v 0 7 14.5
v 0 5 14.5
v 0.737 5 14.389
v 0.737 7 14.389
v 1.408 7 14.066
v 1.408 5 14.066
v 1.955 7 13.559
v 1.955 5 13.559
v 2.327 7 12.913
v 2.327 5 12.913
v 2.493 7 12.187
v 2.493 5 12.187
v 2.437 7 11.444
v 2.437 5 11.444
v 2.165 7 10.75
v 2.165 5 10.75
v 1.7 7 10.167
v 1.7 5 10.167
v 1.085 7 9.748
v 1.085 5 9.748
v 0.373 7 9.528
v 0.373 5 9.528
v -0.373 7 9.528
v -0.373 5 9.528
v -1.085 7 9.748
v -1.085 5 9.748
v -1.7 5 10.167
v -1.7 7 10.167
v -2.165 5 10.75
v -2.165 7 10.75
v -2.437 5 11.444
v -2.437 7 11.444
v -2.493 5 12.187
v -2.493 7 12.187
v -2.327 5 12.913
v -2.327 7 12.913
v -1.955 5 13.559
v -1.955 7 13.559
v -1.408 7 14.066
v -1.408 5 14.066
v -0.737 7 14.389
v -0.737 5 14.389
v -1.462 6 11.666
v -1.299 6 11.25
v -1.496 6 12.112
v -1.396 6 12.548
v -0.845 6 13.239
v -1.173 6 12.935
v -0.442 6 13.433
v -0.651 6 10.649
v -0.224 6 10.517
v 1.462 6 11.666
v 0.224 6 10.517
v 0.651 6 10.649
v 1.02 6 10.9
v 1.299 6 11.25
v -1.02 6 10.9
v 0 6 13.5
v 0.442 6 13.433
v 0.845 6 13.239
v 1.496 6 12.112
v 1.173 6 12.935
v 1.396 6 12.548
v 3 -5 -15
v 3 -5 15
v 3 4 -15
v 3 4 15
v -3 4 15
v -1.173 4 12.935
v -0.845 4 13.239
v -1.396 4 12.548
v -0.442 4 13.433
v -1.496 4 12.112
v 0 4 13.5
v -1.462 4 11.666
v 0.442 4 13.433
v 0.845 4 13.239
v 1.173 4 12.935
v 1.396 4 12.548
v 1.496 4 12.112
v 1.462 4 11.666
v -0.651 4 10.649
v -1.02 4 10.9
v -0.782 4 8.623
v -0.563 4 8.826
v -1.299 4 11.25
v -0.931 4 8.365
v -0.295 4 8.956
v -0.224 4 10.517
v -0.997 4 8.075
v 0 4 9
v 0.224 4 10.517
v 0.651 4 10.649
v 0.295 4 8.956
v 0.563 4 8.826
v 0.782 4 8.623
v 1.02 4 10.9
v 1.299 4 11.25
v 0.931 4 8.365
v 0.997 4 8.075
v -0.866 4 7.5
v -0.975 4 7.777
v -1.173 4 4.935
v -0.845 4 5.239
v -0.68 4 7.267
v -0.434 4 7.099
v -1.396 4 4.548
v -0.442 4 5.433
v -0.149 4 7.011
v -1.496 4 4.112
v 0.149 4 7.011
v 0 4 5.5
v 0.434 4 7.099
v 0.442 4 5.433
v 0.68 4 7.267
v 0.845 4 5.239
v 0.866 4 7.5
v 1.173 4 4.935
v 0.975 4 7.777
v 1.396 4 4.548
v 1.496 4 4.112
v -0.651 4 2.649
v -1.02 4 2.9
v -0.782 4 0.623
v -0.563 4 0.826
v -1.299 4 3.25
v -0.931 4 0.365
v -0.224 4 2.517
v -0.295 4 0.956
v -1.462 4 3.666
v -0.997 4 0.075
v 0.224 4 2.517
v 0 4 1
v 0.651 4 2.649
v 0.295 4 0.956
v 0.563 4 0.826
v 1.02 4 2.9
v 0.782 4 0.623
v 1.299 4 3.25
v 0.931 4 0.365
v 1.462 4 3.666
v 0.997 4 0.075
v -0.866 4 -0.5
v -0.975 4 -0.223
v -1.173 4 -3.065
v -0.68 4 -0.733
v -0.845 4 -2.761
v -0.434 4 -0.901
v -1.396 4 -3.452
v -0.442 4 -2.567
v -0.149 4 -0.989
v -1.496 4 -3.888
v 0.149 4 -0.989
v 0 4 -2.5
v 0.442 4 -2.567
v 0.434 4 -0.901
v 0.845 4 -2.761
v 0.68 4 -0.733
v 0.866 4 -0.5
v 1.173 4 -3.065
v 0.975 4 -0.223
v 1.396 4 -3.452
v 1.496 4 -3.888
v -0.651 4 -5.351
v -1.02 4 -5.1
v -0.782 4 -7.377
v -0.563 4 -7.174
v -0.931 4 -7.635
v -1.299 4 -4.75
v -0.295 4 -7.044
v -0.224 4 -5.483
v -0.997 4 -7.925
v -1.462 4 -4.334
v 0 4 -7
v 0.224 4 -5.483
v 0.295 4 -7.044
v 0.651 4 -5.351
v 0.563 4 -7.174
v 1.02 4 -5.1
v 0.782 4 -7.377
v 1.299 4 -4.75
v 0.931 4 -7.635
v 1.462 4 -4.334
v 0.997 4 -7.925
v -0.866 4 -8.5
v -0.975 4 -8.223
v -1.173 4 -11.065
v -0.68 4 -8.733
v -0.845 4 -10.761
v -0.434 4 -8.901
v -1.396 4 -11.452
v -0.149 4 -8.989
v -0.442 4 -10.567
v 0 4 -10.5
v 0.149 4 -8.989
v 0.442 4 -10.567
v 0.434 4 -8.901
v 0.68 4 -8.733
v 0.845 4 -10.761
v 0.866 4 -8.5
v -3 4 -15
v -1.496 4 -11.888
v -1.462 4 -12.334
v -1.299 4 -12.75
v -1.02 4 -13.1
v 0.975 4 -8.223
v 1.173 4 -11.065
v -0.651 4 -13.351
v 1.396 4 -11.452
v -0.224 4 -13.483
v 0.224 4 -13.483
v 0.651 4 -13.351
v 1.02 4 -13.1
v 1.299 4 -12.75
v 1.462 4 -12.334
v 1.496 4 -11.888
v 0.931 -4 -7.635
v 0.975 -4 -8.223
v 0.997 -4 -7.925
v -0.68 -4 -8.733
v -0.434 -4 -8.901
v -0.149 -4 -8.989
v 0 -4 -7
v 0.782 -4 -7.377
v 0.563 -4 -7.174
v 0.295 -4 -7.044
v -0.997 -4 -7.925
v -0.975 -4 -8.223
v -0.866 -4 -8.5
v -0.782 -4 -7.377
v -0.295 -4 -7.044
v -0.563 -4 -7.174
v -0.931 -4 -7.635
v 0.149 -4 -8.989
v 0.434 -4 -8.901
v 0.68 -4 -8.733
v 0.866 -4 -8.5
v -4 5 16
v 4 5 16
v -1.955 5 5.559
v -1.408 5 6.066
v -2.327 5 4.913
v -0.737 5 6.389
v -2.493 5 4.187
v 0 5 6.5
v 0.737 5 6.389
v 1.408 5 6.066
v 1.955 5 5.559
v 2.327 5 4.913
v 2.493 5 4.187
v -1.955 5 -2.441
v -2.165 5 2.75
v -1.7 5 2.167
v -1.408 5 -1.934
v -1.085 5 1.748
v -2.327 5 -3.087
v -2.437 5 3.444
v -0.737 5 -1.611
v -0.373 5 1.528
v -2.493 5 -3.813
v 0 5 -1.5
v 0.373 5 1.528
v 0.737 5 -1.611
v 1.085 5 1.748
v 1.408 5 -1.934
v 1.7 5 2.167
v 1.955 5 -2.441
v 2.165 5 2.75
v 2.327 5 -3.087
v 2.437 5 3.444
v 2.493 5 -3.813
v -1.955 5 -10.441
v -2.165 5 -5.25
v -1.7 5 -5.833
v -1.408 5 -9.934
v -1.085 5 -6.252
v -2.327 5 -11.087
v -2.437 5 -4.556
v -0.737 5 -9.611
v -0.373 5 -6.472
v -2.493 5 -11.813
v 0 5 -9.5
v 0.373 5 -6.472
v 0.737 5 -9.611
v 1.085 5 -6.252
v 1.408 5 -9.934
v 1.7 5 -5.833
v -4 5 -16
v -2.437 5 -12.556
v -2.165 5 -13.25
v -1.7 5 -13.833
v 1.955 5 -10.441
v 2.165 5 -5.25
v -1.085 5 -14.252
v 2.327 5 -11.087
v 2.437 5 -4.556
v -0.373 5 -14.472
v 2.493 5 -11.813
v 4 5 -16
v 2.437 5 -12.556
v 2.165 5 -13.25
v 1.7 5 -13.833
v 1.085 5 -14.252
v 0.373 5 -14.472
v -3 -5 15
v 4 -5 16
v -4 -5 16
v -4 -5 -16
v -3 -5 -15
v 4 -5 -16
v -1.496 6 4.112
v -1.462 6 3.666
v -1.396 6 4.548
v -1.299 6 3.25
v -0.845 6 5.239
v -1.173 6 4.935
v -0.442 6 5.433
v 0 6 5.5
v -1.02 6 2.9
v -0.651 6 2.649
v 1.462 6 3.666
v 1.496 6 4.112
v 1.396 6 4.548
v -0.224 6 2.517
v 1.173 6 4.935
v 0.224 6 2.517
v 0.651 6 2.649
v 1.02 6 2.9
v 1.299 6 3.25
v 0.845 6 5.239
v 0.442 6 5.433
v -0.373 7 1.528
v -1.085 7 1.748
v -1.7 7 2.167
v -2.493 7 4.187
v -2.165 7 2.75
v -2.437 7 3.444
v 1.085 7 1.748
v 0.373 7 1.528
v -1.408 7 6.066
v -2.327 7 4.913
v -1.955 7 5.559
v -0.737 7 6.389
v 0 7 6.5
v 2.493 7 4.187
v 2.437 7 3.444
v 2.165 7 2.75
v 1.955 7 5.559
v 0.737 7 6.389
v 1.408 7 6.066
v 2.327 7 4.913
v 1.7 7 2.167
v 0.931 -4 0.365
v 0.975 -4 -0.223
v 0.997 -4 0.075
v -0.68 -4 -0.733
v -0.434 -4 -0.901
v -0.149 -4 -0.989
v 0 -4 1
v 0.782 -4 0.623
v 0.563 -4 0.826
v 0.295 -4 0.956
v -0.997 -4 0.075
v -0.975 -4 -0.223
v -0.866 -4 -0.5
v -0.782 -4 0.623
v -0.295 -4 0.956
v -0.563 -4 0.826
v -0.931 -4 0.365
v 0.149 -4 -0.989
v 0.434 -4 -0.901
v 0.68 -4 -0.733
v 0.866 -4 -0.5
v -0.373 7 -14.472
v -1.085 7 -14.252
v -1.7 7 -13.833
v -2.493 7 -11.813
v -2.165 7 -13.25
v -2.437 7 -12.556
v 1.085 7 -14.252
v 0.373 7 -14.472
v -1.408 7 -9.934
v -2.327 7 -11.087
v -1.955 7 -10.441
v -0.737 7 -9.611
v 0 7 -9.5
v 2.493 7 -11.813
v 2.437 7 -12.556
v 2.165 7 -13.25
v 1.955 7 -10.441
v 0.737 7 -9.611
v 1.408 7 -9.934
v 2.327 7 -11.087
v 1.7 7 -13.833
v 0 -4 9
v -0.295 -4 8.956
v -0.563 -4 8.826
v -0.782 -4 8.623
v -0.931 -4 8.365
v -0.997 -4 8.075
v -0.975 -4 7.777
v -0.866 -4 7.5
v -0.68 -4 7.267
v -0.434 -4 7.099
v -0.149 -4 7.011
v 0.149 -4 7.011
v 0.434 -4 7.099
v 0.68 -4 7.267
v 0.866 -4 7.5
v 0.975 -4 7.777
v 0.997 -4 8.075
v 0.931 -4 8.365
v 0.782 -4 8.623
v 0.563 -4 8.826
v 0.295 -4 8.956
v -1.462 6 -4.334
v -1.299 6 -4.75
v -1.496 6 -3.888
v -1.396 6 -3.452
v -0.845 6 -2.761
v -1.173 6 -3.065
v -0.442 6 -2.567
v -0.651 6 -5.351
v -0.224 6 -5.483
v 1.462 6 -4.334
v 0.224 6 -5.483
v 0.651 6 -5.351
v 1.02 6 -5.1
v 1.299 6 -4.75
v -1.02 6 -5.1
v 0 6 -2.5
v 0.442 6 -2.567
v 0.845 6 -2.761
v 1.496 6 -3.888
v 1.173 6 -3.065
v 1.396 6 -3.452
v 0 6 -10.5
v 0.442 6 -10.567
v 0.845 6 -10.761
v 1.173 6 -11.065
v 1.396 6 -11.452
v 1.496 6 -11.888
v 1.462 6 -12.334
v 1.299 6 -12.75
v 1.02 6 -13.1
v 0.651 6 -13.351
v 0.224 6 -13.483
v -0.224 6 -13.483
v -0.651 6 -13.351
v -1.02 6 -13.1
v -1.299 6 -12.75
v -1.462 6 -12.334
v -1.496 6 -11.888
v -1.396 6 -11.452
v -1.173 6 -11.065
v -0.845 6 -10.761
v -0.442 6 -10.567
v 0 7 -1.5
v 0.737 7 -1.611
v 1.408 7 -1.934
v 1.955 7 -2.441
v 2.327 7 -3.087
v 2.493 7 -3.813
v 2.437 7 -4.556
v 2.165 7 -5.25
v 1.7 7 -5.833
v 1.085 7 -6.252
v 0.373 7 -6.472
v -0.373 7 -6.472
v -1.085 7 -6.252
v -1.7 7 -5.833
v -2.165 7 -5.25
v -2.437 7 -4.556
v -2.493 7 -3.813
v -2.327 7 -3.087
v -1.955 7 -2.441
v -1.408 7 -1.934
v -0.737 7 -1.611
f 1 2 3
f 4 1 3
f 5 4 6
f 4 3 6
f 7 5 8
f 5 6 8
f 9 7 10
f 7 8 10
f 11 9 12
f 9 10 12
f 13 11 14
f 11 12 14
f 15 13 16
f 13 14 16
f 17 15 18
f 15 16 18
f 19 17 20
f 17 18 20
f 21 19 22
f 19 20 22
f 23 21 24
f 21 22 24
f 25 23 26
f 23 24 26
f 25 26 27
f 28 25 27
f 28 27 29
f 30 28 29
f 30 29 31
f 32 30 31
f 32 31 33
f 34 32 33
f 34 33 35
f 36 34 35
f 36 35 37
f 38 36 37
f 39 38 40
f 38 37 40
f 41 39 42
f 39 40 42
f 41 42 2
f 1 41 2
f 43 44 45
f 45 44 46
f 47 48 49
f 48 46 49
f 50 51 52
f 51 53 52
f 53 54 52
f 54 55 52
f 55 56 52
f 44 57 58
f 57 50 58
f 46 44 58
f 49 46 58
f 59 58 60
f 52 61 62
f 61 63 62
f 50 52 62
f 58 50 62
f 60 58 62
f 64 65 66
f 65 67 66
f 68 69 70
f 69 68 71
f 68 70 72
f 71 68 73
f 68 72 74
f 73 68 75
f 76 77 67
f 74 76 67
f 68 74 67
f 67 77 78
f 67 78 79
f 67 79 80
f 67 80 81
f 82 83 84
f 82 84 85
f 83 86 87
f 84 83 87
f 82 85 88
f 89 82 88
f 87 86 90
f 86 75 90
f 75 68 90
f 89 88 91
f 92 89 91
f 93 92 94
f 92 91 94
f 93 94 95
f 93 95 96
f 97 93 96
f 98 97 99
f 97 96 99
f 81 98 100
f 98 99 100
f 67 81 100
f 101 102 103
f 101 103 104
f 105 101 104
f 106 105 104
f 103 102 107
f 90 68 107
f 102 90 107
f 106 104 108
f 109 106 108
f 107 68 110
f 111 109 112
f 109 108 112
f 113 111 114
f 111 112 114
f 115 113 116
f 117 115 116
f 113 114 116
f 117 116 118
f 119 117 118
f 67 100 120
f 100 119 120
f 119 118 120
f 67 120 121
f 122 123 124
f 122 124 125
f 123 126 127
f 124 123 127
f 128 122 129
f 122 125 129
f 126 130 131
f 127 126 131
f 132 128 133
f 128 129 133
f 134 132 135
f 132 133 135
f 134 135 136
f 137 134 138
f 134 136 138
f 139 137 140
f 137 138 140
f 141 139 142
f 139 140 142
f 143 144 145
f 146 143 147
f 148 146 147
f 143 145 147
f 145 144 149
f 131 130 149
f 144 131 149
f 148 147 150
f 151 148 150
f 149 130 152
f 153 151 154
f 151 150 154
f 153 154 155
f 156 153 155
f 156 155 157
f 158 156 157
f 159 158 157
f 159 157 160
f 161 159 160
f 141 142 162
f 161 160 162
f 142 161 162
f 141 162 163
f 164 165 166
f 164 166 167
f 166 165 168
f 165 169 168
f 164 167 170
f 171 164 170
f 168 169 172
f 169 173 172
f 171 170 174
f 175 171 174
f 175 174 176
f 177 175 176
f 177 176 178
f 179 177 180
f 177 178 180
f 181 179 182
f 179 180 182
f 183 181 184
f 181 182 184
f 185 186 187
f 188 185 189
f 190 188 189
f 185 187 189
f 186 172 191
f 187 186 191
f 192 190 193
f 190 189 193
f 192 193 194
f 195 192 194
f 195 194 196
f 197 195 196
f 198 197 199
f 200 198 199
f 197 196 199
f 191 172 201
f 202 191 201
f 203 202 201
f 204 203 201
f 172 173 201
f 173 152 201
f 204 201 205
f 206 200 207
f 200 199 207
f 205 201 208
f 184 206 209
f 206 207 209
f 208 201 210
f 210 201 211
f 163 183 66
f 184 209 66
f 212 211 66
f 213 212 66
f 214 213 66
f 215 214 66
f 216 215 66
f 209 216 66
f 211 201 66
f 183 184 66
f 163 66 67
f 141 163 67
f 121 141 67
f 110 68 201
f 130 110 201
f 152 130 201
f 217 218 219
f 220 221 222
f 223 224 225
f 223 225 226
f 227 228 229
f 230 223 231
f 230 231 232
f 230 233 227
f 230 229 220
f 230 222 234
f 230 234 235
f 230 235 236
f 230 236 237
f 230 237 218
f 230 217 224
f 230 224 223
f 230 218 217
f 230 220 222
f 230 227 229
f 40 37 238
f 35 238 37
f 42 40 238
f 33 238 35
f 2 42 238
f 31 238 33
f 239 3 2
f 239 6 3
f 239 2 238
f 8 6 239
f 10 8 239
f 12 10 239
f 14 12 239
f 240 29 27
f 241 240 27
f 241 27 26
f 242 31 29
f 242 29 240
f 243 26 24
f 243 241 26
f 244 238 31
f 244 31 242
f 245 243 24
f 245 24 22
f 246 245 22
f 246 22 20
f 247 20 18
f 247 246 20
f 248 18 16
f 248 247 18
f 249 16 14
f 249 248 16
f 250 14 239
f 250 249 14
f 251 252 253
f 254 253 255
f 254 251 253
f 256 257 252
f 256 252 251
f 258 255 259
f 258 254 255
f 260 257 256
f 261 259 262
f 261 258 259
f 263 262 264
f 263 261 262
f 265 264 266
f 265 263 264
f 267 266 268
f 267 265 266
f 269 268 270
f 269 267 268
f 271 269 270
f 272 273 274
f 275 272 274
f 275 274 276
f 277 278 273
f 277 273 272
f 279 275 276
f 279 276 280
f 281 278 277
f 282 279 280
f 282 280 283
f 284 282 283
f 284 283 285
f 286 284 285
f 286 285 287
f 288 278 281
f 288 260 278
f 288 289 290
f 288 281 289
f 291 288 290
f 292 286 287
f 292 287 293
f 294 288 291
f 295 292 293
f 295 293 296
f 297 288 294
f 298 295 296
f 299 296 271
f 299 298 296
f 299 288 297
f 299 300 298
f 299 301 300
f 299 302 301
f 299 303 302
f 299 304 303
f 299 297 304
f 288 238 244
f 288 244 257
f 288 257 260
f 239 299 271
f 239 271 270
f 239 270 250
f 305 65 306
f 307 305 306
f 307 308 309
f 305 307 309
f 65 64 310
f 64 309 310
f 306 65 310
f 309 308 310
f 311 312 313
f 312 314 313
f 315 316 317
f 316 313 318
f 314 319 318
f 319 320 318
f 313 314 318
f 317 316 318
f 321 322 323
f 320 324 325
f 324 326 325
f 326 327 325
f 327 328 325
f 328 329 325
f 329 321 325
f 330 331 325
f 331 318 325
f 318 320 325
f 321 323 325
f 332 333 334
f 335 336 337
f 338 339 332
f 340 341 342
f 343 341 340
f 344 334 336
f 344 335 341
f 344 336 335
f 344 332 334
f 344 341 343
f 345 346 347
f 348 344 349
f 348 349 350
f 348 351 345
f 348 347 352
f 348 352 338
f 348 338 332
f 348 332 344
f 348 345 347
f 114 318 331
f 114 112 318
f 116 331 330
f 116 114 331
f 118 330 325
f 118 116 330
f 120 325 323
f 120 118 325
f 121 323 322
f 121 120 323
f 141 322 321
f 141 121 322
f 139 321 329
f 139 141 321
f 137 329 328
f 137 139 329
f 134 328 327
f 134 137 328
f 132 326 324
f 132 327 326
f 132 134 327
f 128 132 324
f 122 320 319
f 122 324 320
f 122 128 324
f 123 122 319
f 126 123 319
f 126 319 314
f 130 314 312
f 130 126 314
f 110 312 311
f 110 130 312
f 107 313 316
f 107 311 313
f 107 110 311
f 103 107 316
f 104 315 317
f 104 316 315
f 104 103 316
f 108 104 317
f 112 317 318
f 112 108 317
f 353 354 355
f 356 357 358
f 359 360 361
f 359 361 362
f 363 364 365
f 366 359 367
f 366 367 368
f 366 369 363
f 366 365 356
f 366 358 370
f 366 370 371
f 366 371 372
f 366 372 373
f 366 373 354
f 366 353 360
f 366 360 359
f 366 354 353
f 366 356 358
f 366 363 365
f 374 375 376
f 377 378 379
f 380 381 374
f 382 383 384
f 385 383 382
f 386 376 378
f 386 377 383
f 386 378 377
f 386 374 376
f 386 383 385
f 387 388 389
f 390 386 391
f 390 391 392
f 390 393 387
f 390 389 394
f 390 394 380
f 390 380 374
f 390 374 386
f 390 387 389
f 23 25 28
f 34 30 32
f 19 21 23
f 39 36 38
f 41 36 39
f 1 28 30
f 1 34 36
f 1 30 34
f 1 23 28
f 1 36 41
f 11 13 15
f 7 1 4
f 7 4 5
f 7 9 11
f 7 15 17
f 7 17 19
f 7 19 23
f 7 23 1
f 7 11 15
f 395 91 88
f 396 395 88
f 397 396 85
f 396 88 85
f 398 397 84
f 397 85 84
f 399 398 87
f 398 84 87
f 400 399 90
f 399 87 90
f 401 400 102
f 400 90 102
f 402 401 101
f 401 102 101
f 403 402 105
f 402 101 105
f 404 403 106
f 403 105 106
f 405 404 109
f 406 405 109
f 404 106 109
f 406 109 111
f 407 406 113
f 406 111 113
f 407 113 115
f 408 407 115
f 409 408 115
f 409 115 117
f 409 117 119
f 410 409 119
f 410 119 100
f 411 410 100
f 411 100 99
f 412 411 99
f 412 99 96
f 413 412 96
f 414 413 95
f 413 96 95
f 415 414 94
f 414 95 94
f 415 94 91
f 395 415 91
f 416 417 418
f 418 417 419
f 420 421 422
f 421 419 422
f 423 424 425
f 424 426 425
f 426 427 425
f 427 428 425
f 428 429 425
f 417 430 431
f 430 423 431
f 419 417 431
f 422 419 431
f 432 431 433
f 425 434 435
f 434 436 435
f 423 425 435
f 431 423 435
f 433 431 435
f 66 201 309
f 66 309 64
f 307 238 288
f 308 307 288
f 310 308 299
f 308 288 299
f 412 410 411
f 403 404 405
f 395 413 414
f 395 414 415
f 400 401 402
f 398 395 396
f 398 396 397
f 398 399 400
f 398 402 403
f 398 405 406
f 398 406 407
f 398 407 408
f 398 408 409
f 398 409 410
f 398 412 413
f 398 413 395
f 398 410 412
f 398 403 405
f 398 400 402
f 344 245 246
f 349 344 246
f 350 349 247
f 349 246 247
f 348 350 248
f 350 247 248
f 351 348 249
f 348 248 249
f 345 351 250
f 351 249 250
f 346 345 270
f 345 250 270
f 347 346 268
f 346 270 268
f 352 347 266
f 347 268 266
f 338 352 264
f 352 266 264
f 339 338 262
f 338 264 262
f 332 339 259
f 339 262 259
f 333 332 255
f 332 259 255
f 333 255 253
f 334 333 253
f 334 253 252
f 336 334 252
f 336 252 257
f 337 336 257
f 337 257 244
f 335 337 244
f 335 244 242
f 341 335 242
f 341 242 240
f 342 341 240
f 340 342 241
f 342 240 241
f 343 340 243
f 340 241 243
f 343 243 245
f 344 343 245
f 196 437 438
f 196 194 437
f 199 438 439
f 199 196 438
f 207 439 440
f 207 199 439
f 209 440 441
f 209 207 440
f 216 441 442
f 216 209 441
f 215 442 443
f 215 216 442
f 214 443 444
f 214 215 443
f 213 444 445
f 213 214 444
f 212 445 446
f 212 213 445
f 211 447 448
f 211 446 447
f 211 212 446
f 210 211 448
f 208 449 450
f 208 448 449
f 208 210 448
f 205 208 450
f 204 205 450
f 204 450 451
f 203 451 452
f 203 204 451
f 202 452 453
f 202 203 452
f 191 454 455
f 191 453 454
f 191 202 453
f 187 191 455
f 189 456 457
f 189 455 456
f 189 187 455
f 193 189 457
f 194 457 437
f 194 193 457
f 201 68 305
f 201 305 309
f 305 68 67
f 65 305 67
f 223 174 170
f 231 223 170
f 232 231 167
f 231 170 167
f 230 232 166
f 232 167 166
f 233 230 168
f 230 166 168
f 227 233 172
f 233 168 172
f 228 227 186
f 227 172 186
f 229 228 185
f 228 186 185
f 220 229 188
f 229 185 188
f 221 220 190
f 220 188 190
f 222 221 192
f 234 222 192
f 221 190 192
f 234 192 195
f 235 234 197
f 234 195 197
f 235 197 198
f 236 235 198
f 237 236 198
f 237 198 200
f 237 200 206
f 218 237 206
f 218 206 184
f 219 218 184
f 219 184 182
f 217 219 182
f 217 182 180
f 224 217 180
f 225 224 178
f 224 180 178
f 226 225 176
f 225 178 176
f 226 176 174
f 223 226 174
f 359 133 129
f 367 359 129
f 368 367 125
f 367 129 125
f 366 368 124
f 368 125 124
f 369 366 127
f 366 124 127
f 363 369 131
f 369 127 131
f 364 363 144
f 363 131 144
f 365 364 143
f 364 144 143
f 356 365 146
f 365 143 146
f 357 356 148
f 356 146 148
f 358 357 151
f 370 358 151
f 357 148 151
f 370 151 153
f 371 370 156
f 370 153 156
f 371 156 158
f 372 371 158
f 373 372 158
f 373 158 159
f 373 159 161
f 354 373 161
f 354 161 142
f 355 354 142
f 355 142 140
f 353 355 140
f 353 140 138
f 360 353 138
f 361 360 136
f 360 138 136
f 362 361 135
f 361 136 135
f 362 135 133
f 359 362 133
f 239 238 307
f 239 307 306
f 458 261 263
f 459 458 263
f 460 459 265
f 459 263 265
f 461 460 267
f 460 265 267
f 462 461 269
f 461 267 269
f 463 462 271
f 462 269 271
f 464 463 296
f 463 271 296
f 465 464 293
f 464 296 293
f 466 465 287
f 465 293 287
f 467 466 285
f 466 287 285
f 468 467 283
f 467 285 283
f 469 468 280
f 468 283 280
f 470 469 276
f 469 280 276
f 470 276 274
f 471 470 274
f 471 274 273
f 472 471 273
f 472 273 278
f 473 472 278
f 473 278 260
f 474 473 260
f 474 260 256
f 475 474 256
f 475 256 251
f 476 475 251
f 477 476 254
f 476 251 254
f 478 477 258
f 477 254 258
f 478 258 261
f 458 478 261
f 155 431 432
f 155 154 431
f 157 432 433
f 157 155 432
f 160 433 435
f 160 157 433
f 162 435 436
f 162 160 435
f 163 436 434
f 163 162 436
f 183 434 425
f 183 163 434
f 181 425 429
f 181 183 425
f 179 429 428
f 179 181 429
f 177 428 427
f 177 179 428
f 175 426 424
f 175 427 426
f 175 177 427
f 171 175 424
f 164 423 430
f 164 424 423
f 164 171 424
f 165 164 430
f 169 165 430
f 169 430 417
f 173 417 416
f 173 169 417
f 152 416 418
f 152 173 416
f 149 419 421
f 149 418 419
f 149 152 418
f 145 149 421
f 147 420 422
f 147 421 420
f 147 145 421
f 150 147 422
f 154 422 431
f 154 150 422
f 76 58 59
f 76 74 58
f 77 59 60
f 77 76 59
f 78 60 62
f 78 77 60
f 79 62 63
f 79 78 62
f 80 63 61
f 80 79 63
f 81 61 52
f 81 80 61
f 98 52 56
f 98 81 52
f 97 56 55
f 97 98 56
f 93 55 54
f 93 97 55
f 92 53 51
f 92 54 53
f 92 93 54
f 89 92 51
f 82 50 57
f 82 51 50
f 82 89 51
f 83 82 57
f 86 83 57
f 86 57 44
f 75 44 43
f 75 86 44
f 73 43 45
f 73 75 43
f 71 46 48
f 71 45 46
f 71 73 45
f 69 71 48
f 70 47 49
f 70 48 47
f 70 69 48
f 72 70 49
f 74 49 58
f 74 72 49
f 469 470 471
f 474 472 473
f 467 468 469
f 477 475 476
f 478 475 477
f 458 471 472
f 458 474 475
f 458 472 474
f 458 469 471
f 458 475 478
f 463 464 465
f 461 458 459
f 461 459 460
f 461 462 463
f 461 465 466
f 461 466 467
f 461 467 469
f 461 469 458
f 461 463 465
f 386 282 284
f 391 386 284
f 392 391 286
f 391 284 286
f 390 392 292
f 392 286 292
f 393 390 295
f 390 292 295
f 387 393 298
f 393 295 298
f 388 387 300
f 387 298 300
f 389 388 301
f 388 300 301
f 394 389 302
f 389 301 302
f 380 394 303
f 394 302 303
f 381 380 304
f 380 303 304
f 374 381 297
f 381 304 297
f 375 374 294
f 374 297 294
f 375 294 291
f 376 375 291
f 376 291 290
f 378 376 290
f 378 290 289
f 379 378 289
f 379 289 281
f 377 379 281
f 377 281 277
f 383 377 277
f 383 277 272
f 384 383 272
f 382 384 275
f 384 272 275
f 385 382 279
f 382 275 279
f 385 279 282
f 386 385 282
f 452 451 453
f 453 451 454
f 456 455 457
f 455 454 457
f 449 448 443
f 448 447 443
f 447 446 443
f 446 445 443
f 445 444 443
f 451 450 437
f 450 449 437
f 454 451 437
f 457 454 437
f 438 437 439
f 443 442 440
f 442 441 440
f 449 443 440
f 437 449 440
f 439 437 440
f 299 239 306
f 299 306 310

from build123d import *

# Parameters (mm, degrees)
SKETCH1_W                 = 8
SKETCH1_H                 = 32
BASE_EXTRUDE_DEPTH        = 5
SKETCH2_R                 = 2.5
BOSS_EXTRUDE1_DEPTH       = 2
TOP_BUTTON_PATTERN_COUNT  = 4
TOP_BUTTON_PATTERN_PITCH  = 8
SHELL1_T                  = -1
SKETCH3_R                 = 1
BOTTOM_POST_DEPTH         = 8
BOTTOM_POST_PATTERN_COUNT = 3
BOTTOM_POST_PATTERN_PITCH = 8


with BuildPart() as part:
    # Sketch1 → Base-Extrude (new, symmetric)
    with BuildSketch(Plane(origin=(0, 0, 0), x_dir=(1, 0, 0), z_dir=(0, 1, 0))):
        Rectangle(SKETCH1_W, SKETCH1_H)
    extrude(amount=BASE_EXTRUDE_DEPTH, both=True)

    # Sketch2 → Boss-Extrude1 (add)
    with BuildSketch(Plane(origin=(0, 5, 0), x_dir=(-1, 0, 0), z_dir=(0, 1, 0))):
        with Locations(Location((0, 12, 0), (0, 0, 90))):
            Circle(SKETCH2_R)
    boss_extrude1 = extrude(amount=BOSS_EXTRUDE1_DEPTH)

    # Top Button Pattern: Boss-Extrude1 ×4
    with Locations(*[(0, 0, -i * TOP_BUTTON_PATTERN_PITCH) for i in range(1, TOP_BUTTON_PATTERN_COUNT)]):
        add(boss_extrude1)

    # Shell1
    shell1_openings = [part.faces().sort_by_distance(p)[0] for p in [
        (0, -5, 0),
    ]]
    offset(amount=SHELL1_T, openings=shell1_openings, kind=Kind.INTERSECTION)

    # Sketch3 → Bottom Post (add)
    with BuildSketch(Plane.XZ.offset(-4)):
        with Locations(Location((0, 8, 0), (0, 0, 90))):
            Circle(SKETCH3_R)
    bottom_post = extrude(amount=BOTTOM_POST_DEPTH)

    # Bottom Post Pattern: Bottom Post ×3
    with Locations(*[(0, 0, -i * BOTTOM_POST_PATTERN_PITCH) for i in range(1, BOTTOM_POST_PATTERN_COUNT)]):
        add(bottom_post)


solid = part.part
